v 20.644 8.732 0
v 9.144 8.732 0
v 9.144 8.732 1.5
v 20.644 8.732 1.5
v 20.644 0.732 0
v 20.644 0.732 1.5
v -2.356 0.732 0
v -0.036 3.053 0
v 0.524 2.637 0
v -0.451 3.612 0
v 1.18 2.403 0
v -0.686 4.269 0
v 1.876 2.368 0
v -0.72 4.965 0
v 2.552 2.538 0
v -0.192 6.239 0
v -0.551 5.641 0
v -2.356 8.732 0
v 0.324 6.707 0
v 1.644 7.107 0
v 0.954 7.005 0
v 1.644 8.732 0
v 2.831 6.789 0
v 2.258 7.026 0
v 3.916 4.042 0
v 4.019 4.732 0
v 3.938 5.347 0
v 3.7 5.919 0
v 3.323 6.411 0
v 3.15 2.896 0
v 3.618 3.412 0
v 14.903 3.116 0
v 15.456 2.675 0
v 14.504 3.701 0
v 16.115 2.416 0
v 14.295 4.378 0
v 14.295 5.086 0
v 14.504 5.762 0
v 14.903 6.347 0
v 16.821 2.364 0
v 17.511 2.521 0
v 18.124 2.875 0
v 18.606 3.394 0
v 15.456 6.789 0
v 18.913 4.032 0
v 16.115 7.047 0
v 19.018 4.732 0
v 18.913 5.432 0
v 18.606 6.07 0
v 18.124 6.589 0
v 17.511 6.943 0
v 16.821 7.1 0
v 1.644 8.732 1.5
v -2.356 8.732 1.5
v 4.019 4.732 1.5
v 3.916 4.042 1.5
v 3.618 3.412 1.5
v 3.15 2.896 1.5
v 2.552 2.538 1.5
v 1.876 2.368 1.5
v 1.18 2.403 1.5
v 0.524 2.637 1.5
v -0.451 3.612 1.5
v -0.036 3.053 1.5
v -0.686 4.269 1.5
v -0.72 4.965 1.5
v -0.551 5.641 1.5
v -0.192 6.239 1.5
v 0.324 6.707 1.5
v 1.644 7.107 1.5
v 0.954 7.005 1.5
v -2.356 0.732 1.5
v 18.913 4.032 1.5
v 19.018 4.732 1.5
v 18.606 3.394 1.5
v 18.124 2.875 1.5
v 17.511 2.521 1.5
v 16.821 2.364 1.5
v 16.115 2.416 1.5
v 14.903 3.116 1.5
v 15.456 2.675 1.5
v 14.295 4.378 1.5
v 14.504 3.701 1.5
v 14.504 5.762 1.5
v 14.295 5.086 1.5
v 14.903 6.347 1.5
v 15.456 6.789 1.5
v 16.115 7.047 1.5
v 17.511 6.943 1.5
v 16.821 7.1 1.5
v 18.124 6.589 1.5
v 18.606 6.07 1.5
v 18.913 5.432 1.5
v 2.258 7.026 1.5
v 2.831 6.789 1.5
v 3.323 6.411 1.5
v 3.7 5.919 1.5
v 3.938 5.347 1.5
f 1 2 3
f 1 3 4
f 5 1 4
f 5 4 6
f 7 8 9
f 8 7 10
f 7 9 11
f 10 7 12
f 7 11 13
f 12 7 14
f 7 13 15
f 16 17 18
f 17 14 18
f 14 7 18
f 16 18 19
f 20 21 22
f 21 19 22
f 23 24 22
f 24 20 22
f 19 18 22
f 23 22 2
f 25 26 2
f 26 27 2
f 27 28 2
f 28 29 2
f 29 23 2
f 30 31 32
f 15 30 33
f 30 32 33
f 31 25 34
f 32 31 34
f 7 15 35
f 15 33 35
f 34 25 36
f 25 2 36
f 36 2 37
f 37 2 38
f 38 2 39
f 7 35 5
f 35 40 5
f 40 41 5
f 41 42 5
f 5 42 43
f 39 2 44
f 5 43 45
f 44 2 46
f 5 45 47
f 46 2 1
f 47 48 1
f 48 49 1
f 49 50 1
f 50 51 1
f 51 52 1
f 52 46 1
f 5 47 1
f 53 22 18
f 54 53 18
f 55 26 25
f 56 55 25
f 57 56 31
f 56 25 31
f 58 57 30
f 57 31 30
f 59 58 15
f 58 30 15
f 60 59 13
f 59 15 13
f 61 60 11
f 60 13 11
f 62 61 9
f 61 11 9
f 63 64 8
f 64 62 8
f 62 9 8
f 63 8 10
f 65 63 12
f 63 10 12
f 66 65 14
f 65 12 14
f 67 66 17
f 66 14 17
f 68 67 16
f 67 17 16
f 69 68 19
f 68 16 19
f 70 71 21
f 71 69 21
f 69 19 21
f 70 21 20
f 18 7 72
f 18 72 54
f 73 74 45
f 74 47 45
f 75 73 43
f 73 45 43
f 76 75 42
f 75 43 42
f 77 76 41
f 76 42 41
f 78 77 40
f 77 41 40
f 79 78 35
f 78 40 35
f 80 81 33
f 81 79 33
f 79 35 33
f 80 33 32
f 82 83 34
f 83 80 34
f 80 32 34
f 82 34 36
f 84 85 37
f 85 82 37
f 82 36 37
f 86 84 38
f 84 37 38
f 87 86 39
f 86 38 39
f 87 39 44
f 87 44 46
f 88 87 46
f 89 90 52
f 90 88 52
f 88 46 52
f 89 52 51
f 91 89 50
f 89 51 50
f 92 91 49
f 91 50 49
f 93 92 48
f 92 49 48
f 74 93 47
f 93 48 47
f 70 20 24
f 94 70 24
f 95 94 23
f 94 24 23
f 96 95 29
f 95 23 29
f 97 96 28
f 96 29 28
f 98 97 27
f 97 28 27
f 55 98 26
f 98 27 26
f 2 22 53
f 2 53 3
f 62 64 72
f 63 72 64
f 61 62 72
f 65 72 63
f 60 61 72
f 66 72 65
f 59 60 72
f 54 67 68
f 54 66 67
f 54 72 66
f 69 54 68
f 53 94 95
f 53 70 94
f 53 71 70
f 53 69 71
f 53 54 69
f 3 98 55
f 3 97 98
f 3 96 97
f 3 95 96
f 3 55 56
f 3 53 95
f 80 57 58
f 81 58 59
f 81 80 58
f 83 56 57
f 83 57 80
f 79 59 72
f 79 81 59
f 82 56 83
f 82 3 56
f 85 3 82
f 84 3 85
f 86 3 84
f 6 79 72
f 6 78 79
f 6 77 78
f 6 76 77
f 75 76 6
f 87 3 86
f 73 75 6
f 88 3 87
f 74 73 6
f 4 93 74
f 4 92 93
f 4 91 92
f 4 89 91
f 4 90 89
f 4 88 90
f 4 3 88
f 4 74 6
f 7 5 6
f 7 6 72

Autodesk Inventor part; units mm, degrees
ref_plane "YZ Plane" through (0, 0, 0) normal (1, 0, 0) x (0, 1, 0)
ref_plane "XZ Plane" through (0, 0, 0) normal (0, 1, 0) x (-1, 0, 0)
ref_plane "XY Plane" through (0, 0, 0) normal (0, 0, 1) x (1, 0, 0)
sketch "Sketch2" plane through (0, 0, 0) normal (0, 0, 1) x (1, 0, 0)
  circle A0 centre (1.6435, 4.7319) radius 2.125 projected
  circle A1 centre (1.6435, 4.7319) radius 2.375
  line L0 (1.6435, 4.7319) -> (1.6435, 8.7319)
  line L1 (1.6435, 8.7319) -> (-2.3565, 8.7319)
  line L2 (-2.3565, 8.7319) -> (20.6435, 8.7319)
  line L3 (20.6435, 8.7319) -> (20.6435, 0.7319)
  line L4 (20.6435, 0.7319) -> (-2.3565, 0.7319)
  line L5 (-2.3565, 0.7319) -> (-2.3565, 8.7319)
  line L6 (9.1435, 8.7319) -> (9.1435, 2)
  circle A2 centre (16.6435, 4.7319) radius 2.375
  point P0 (0, 0)
  dimension "d0" = 4.75
  dimension "d1" = 4
  dimension "d2" = 4
  dimension "d3" = 23
  dimension "d4" = 8
extrude "Extrusion1" add sketch "Sketch2" along normal blind 1.5 contours L2 L3 L4 L5 L1
properties part number "Connector"
